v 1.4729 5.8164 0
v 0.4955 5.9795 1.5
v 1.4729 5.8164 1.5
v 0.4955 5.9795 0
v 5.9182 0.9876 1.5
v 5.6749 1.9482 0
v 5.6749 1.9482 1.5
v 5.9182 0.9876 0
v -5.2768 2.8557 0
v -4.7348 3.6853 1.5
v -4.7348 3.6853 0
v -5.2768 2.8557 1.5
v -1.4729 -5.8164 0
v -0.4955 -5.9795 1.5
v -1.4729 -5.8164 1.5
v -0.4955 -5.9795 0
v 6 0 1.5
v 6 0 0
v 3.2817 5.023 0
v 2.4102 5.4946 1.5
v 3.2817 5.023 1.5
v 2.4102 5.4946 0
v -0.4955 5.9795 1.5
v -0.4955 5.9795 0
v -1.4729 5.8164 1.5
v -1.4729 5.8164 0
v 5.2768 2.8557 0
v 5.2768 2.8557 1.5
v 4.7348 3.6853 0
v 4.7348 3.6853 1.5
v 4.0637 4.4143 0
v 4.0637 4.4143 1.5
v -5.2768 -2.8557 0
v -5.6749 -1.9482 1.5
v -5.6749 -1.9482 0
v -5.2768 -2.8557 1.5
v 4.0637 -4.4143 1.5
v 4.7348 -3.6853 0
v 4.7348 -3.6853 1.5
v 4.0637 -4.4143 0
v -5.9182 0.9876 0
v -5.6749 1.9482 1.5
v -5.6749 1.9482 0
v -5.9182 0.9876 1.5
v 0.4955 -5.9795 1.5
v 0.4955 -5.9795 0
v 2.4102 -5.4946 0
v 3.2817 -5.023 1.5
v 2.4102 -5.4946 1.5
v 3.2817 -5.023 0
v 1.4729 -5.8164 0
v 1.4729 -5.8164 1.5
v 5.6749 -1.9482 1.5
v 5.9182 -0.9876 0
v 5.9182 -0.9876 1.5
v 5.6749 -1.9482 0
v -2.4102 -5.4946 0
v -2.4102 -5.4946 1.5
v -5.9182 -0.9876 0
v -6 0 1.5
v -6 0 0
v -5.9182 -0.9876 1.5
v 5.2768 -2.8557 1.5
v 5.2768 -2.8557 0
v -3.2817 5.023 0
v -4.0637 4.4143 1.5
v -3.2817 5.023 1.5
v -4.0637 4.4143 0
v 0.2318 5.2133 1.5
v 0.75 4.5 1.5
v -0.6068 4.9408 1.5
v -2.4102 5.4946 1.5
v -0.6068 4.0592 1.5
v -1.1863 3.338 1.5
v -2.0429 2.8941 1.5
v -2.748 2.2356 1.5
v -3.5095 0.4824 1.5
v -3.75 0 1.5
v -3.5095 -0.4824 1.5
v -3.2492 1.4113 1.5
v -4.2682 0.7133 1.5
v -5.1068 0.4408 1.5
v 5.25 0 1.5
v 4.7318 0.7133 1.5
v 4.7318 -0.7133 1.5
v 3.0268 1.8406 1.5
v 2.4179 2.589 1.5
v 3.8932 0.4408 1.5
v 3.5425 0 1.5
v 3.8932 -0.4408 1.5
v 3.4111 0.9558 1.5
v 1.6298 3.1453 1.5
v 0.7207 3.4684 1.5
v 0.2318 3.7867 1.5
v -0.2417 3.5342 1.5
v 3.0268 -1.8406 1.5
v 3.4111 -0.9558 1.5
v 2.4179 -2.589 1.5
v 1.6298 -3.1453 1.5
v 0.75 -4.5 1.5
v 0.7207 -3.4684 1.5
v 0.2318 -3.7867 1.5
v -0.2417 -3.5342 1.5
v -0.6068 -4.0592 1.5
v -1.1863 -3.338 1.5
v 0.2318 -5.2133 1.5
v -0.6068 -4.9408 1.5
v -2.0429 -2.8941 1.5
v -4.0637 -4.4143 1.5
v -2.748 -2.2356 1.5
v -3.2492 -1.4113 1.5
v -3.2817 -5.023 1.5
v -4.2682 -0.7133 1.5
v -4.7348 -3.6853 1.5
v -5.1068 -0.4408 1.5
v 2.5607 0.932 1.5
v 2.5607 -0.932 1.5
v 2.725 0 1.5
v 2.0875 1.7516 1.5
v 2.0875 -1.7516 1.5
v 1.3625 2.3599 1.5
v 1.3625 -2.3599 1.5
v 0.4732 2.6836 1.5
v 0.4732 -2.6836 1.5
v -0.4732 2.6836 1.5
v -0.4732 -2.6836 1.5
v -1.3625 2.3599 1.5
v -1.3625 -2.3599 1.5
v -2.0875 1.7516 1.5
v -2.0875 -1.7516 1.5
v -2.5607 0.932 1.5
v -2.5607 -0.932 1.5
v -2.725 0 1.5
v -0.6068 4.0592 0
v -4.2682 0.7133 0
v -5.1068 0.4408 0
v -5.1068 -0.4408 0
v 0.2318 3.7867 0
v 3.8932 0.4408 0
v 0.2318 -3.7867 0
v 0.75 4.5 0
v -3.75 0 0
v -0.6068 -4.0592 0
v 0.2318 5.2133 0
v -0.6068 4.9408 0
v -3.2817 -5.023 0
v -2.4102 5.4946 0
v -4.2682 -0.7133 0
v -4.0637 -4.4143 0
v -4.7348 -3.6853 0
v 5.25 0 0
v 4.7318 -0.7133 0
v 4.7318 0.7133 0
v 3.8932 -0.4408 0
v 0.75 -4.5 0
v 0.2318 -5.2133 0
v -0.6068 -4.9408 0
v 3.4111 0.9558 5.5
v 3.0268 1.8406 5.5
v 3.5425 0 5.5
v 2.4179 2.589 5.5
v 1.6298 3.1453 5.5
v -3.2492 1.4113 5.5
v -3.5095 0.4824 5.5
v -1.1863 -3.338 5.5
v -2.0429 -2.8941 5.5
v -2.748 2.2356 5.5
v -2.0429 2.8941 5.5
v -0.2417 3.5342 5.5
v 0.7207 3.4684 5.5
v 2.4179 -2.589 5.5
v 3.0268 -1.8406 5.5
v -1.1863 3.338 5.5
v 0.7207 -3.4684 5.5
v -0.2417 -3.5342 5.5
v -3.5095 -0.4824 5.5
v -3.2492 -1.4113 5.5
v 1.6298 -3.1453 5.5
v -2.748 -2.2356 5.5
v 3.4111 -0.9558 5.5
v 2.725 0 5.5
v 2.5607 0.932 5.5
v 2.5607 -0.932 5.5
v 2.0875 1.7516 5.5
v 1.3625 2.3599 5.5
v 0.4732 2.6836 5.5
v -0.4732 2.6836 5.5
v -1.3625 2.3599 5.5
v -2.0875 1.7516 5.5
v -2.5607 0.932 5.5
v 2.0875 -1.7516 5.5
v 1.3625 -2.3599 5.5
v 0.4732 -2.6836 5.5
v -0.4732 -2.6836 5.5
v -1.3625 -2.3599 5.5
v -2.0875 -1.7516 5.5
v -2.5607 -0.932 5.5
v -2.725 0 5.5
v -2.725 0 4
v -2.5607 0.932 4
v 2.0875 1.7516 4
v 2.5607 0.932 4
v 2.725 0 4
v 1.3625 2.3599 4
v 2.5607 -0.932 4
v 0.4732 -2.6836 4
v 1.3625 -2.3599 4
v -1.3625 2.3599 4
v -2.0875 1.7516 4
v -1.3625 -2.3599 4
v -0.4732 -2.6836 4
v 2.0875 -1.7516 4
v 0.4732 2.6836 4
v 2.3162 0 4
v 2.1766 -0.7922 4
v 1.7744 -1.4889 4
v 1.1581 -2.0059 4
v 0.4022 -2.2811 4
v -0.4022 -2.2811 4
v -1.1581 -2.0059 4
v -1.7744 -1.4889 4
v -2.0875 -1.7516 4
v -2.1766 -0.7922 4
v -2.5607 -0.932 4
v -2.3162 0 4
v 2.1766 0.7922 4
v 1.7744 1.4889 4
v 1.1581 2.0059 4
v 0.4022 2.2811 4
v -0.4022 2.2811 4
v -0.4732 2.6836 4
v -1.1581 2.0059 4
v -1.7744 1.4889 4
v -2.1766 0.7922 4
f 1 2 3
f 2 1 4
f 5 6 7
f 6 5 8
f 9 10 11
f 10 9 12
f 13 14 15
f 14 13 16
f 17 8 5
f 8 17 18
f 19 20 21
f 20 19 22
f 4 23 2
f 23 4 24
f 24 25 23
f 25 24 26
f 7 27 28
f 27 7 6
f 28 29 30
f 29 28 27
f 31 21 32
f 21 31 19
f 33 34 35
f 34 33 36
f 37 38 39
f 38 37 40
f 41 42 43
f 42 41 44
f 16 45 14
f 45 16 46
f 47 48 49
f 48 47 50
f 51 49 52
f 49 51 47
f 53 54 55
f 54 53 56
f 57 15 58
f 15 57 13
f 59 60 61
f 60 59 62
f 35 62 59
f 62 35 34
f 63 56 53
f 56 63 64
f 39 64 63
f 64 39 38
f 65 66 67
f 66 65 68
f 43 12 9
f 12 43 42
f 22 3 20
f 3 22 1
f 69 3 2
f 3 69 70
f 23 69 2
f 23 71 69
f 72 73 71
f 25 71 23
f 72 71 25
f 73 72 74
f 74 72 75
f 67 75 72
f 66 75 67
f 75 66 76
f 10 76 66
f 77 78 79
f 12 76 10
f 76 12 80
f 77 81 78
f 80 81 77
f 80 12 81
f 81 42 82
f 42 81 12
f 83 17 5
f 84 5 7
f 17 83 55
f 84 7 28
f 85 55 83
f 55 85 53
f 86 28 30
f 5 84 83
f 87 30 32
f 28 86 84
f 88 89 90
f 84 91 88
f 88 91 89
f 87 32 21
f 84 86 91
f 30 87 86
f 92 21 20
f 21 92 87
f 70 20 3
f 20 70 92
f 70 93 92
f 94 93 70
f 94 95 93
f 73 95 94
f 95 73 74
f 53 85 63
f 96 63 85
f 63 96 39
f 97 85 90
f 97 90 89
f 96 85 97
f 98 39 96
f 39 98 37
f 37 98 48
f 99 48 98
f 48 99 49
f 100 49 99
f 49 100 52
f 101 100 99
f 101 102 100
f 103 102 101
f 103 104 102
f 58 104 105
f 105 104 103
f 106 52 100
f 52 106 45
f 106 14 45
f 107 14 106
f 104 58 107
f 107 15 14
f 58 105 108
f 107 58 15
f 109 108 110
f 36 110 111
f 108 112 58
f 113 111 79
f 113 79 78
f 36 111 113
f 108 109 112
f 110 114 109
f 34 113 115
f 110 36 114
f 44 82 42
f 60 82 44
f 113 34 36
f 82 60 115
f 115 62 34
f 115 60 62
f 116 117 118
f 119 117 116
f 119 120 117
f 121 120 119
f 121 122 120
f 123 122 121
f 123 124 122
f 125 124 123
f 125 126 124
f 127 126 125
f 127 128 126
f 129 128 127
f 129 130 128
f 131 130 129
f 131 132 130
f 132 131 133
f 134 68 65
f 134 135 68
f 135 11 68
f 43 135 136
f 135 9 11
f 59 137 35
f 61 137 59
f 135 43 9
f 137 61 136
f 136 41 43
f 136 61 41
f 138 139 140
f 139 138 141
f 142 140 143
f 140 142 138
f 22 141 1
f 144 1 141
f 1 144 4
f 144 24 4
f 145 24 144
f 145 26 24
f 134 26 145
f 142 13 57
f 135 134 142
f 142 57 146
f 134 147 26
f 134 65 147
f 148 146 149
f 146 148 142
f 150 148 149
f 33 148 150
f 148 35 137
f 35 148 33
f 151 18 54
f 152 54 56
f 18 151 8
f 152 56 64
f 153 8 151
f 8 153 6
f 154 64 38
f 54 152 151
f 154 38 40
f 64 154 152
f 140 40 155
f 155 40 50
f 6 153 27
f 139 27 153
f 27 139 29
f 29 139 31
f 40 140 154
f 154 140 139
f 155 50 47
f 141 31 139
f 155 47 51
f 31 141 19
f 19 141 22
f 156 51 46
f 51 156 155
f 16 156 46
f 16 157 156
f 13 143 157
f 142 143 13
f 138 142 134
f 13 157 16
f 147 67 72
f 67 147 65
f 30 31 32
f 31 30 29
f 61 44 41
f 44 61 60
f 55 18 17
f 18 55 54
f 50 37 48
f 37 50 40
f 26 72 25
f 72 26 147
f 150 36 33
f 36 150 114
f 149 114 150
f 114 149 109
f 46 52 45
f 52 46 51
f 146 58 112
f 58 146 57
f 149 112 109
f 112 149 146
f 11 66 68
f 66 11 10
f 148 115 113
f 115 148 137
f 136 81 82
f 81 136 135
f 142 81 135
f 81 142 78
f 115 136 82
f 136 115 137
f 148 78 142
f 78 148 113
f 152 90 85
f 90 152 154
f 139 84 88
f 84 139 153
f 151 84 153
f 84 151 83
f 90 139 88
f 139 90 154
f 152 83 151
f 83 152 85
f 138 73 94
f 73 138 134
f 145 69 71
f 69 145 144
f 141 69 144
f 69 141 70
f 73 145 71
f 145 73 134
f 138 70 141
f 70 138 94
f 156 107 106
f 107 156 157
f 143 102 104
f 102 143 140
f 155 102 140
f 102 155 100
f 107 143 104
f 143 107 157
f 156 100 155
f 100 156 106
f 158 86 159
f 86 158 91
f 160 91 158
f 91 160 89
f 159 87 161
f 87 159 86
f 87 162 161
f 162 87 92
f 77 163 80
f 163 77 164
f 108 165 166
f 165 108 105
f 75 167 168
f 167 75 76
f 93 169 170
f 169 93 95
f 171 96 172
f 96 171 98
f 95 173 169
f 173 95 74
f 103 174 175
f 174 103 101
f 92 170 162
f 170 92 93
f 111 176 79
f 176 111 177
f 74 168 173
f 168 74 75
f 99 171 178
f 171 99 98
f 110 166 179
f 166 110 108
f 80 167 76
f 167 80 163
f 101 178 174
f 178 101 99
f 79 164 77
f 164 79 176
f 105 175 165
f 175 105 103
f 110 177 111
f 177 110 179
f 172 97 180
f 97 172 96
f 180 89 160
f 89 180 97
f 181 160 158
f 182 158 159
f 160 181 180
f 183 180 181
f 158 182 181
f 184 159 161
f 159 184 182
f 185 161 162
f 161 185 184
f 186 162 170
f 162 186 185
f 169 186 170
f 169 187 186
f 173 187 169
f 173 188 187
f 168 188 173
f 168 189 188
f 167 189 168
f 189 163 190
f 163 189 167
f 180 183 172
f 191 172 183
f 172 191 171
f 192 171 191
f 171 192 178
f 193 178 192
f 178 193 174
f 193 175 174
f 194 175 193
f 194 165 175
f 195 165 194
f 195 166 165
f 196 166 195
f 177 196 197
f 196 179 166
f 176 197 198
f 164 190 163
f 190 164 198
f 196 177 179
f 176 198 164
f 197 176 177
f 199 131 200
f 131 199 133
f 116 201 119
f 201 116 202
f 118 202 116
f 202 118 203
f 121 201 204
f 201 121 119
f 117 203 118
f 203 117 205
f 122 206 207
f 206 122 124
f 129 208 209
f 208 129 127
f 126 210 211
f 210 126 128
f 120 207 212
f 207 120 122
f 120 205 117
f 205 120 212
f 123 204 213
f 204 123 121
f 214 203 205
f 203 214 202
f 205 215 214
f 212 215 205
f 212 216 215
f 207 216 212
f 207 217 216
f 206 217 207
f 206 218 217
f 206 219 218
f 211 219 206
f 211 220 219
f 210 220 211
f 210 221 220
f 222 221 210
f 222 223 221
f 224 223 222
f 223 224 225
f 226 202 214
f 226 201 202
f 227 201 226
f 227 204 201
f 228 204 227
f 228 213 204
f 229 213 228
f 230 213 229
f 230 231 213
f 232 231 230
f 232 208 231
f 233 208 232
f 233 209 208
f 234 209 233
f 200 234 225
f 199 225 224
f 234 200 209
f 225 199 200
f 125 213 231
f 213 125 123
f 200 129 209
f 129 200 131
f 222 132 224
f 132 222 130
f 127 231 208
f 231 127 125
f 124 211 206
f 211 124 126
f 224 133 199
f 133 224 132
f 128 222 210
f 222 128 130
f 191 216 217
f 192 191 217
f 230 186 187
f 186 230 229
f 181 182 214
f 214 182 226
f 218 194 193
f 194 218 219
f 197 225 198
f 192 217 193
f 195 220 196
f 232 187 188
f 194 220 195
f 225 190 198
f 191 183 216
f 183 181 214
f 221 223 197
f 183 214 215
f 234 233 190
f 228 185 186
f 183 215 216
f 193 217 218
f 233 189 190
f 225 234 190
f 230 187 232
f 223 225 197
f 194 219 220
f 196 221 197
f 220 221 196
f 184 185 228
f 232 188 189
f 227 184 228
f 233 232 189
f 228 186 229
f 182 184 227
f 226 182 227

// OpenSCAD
/*
 Button holder for stud-style buttons.
 Button has a stud with 5.5mm diameter ball end with
 a 5.0mm collar about 3.3mm from the top of the ball.
 Total width is 18.5mm
*/

$fa = 1;
$fs = 1;

BackPlateWidth = 12;
CollarWidth = 4.25;
CollarDepth = 2.5;
StudWidth = 5;
StudDepth = 4;
Thickness = 1.5;
Fudge = 9;


/* Create the bottom plate */
difference() {
  cylinder(h=Thickness,r=BackPlateWidth/2);
  translate([-1*(BackPlateWidth/2-Thickness),0,0]) {
    cylinder(h=Thickness,r=Thickness/2);
  }
  translate([(BackPlateWidth/2-Thickness),0,0]) {
    cylinder(h=Thickness,r=Thickness/2);
  }
  translate([0,BackPlateWidth/2-Thickness,0]) {
    cylinder(h=Thickness,r=Thickness/2);
  }
  translate([0,-1*(BackPlateWidth/2-Thickness),0]) {
    cylinder(h=Thickness,r=Thickness/2);
  }
}

SW = StudWidth*(100+Fudge)/100;
CW = CollarWidth*(100+Fudge)/100;
WW = (StudWidth+Thickness)*(100+Fudge)/100;

/* Add the stud holder */
translate([0,0,Thickness]) {
  difference() {
    cylinder(h=StudDepth,d=WW);
    cylinder(h=CollarDepth,d=SW);
    translate([0,0,CollarDepth]) {
      cylinder(h=StudDepth-CollarDepth,d2=SW,d1=CW);
      /*
      translate([-0.5,-1*(SW+Thickness*2)/2,0]) {
        cube([1,SW+Thickness*2,StudDepth-CollarDepth]);
      }
      translate([-1*(SW+Thickness*2)/2,-0.5,0]) {
        cube([SW+Thickness*2,1,StudDepth-CollarDepth]);
      }
      */
    }
  }
}
